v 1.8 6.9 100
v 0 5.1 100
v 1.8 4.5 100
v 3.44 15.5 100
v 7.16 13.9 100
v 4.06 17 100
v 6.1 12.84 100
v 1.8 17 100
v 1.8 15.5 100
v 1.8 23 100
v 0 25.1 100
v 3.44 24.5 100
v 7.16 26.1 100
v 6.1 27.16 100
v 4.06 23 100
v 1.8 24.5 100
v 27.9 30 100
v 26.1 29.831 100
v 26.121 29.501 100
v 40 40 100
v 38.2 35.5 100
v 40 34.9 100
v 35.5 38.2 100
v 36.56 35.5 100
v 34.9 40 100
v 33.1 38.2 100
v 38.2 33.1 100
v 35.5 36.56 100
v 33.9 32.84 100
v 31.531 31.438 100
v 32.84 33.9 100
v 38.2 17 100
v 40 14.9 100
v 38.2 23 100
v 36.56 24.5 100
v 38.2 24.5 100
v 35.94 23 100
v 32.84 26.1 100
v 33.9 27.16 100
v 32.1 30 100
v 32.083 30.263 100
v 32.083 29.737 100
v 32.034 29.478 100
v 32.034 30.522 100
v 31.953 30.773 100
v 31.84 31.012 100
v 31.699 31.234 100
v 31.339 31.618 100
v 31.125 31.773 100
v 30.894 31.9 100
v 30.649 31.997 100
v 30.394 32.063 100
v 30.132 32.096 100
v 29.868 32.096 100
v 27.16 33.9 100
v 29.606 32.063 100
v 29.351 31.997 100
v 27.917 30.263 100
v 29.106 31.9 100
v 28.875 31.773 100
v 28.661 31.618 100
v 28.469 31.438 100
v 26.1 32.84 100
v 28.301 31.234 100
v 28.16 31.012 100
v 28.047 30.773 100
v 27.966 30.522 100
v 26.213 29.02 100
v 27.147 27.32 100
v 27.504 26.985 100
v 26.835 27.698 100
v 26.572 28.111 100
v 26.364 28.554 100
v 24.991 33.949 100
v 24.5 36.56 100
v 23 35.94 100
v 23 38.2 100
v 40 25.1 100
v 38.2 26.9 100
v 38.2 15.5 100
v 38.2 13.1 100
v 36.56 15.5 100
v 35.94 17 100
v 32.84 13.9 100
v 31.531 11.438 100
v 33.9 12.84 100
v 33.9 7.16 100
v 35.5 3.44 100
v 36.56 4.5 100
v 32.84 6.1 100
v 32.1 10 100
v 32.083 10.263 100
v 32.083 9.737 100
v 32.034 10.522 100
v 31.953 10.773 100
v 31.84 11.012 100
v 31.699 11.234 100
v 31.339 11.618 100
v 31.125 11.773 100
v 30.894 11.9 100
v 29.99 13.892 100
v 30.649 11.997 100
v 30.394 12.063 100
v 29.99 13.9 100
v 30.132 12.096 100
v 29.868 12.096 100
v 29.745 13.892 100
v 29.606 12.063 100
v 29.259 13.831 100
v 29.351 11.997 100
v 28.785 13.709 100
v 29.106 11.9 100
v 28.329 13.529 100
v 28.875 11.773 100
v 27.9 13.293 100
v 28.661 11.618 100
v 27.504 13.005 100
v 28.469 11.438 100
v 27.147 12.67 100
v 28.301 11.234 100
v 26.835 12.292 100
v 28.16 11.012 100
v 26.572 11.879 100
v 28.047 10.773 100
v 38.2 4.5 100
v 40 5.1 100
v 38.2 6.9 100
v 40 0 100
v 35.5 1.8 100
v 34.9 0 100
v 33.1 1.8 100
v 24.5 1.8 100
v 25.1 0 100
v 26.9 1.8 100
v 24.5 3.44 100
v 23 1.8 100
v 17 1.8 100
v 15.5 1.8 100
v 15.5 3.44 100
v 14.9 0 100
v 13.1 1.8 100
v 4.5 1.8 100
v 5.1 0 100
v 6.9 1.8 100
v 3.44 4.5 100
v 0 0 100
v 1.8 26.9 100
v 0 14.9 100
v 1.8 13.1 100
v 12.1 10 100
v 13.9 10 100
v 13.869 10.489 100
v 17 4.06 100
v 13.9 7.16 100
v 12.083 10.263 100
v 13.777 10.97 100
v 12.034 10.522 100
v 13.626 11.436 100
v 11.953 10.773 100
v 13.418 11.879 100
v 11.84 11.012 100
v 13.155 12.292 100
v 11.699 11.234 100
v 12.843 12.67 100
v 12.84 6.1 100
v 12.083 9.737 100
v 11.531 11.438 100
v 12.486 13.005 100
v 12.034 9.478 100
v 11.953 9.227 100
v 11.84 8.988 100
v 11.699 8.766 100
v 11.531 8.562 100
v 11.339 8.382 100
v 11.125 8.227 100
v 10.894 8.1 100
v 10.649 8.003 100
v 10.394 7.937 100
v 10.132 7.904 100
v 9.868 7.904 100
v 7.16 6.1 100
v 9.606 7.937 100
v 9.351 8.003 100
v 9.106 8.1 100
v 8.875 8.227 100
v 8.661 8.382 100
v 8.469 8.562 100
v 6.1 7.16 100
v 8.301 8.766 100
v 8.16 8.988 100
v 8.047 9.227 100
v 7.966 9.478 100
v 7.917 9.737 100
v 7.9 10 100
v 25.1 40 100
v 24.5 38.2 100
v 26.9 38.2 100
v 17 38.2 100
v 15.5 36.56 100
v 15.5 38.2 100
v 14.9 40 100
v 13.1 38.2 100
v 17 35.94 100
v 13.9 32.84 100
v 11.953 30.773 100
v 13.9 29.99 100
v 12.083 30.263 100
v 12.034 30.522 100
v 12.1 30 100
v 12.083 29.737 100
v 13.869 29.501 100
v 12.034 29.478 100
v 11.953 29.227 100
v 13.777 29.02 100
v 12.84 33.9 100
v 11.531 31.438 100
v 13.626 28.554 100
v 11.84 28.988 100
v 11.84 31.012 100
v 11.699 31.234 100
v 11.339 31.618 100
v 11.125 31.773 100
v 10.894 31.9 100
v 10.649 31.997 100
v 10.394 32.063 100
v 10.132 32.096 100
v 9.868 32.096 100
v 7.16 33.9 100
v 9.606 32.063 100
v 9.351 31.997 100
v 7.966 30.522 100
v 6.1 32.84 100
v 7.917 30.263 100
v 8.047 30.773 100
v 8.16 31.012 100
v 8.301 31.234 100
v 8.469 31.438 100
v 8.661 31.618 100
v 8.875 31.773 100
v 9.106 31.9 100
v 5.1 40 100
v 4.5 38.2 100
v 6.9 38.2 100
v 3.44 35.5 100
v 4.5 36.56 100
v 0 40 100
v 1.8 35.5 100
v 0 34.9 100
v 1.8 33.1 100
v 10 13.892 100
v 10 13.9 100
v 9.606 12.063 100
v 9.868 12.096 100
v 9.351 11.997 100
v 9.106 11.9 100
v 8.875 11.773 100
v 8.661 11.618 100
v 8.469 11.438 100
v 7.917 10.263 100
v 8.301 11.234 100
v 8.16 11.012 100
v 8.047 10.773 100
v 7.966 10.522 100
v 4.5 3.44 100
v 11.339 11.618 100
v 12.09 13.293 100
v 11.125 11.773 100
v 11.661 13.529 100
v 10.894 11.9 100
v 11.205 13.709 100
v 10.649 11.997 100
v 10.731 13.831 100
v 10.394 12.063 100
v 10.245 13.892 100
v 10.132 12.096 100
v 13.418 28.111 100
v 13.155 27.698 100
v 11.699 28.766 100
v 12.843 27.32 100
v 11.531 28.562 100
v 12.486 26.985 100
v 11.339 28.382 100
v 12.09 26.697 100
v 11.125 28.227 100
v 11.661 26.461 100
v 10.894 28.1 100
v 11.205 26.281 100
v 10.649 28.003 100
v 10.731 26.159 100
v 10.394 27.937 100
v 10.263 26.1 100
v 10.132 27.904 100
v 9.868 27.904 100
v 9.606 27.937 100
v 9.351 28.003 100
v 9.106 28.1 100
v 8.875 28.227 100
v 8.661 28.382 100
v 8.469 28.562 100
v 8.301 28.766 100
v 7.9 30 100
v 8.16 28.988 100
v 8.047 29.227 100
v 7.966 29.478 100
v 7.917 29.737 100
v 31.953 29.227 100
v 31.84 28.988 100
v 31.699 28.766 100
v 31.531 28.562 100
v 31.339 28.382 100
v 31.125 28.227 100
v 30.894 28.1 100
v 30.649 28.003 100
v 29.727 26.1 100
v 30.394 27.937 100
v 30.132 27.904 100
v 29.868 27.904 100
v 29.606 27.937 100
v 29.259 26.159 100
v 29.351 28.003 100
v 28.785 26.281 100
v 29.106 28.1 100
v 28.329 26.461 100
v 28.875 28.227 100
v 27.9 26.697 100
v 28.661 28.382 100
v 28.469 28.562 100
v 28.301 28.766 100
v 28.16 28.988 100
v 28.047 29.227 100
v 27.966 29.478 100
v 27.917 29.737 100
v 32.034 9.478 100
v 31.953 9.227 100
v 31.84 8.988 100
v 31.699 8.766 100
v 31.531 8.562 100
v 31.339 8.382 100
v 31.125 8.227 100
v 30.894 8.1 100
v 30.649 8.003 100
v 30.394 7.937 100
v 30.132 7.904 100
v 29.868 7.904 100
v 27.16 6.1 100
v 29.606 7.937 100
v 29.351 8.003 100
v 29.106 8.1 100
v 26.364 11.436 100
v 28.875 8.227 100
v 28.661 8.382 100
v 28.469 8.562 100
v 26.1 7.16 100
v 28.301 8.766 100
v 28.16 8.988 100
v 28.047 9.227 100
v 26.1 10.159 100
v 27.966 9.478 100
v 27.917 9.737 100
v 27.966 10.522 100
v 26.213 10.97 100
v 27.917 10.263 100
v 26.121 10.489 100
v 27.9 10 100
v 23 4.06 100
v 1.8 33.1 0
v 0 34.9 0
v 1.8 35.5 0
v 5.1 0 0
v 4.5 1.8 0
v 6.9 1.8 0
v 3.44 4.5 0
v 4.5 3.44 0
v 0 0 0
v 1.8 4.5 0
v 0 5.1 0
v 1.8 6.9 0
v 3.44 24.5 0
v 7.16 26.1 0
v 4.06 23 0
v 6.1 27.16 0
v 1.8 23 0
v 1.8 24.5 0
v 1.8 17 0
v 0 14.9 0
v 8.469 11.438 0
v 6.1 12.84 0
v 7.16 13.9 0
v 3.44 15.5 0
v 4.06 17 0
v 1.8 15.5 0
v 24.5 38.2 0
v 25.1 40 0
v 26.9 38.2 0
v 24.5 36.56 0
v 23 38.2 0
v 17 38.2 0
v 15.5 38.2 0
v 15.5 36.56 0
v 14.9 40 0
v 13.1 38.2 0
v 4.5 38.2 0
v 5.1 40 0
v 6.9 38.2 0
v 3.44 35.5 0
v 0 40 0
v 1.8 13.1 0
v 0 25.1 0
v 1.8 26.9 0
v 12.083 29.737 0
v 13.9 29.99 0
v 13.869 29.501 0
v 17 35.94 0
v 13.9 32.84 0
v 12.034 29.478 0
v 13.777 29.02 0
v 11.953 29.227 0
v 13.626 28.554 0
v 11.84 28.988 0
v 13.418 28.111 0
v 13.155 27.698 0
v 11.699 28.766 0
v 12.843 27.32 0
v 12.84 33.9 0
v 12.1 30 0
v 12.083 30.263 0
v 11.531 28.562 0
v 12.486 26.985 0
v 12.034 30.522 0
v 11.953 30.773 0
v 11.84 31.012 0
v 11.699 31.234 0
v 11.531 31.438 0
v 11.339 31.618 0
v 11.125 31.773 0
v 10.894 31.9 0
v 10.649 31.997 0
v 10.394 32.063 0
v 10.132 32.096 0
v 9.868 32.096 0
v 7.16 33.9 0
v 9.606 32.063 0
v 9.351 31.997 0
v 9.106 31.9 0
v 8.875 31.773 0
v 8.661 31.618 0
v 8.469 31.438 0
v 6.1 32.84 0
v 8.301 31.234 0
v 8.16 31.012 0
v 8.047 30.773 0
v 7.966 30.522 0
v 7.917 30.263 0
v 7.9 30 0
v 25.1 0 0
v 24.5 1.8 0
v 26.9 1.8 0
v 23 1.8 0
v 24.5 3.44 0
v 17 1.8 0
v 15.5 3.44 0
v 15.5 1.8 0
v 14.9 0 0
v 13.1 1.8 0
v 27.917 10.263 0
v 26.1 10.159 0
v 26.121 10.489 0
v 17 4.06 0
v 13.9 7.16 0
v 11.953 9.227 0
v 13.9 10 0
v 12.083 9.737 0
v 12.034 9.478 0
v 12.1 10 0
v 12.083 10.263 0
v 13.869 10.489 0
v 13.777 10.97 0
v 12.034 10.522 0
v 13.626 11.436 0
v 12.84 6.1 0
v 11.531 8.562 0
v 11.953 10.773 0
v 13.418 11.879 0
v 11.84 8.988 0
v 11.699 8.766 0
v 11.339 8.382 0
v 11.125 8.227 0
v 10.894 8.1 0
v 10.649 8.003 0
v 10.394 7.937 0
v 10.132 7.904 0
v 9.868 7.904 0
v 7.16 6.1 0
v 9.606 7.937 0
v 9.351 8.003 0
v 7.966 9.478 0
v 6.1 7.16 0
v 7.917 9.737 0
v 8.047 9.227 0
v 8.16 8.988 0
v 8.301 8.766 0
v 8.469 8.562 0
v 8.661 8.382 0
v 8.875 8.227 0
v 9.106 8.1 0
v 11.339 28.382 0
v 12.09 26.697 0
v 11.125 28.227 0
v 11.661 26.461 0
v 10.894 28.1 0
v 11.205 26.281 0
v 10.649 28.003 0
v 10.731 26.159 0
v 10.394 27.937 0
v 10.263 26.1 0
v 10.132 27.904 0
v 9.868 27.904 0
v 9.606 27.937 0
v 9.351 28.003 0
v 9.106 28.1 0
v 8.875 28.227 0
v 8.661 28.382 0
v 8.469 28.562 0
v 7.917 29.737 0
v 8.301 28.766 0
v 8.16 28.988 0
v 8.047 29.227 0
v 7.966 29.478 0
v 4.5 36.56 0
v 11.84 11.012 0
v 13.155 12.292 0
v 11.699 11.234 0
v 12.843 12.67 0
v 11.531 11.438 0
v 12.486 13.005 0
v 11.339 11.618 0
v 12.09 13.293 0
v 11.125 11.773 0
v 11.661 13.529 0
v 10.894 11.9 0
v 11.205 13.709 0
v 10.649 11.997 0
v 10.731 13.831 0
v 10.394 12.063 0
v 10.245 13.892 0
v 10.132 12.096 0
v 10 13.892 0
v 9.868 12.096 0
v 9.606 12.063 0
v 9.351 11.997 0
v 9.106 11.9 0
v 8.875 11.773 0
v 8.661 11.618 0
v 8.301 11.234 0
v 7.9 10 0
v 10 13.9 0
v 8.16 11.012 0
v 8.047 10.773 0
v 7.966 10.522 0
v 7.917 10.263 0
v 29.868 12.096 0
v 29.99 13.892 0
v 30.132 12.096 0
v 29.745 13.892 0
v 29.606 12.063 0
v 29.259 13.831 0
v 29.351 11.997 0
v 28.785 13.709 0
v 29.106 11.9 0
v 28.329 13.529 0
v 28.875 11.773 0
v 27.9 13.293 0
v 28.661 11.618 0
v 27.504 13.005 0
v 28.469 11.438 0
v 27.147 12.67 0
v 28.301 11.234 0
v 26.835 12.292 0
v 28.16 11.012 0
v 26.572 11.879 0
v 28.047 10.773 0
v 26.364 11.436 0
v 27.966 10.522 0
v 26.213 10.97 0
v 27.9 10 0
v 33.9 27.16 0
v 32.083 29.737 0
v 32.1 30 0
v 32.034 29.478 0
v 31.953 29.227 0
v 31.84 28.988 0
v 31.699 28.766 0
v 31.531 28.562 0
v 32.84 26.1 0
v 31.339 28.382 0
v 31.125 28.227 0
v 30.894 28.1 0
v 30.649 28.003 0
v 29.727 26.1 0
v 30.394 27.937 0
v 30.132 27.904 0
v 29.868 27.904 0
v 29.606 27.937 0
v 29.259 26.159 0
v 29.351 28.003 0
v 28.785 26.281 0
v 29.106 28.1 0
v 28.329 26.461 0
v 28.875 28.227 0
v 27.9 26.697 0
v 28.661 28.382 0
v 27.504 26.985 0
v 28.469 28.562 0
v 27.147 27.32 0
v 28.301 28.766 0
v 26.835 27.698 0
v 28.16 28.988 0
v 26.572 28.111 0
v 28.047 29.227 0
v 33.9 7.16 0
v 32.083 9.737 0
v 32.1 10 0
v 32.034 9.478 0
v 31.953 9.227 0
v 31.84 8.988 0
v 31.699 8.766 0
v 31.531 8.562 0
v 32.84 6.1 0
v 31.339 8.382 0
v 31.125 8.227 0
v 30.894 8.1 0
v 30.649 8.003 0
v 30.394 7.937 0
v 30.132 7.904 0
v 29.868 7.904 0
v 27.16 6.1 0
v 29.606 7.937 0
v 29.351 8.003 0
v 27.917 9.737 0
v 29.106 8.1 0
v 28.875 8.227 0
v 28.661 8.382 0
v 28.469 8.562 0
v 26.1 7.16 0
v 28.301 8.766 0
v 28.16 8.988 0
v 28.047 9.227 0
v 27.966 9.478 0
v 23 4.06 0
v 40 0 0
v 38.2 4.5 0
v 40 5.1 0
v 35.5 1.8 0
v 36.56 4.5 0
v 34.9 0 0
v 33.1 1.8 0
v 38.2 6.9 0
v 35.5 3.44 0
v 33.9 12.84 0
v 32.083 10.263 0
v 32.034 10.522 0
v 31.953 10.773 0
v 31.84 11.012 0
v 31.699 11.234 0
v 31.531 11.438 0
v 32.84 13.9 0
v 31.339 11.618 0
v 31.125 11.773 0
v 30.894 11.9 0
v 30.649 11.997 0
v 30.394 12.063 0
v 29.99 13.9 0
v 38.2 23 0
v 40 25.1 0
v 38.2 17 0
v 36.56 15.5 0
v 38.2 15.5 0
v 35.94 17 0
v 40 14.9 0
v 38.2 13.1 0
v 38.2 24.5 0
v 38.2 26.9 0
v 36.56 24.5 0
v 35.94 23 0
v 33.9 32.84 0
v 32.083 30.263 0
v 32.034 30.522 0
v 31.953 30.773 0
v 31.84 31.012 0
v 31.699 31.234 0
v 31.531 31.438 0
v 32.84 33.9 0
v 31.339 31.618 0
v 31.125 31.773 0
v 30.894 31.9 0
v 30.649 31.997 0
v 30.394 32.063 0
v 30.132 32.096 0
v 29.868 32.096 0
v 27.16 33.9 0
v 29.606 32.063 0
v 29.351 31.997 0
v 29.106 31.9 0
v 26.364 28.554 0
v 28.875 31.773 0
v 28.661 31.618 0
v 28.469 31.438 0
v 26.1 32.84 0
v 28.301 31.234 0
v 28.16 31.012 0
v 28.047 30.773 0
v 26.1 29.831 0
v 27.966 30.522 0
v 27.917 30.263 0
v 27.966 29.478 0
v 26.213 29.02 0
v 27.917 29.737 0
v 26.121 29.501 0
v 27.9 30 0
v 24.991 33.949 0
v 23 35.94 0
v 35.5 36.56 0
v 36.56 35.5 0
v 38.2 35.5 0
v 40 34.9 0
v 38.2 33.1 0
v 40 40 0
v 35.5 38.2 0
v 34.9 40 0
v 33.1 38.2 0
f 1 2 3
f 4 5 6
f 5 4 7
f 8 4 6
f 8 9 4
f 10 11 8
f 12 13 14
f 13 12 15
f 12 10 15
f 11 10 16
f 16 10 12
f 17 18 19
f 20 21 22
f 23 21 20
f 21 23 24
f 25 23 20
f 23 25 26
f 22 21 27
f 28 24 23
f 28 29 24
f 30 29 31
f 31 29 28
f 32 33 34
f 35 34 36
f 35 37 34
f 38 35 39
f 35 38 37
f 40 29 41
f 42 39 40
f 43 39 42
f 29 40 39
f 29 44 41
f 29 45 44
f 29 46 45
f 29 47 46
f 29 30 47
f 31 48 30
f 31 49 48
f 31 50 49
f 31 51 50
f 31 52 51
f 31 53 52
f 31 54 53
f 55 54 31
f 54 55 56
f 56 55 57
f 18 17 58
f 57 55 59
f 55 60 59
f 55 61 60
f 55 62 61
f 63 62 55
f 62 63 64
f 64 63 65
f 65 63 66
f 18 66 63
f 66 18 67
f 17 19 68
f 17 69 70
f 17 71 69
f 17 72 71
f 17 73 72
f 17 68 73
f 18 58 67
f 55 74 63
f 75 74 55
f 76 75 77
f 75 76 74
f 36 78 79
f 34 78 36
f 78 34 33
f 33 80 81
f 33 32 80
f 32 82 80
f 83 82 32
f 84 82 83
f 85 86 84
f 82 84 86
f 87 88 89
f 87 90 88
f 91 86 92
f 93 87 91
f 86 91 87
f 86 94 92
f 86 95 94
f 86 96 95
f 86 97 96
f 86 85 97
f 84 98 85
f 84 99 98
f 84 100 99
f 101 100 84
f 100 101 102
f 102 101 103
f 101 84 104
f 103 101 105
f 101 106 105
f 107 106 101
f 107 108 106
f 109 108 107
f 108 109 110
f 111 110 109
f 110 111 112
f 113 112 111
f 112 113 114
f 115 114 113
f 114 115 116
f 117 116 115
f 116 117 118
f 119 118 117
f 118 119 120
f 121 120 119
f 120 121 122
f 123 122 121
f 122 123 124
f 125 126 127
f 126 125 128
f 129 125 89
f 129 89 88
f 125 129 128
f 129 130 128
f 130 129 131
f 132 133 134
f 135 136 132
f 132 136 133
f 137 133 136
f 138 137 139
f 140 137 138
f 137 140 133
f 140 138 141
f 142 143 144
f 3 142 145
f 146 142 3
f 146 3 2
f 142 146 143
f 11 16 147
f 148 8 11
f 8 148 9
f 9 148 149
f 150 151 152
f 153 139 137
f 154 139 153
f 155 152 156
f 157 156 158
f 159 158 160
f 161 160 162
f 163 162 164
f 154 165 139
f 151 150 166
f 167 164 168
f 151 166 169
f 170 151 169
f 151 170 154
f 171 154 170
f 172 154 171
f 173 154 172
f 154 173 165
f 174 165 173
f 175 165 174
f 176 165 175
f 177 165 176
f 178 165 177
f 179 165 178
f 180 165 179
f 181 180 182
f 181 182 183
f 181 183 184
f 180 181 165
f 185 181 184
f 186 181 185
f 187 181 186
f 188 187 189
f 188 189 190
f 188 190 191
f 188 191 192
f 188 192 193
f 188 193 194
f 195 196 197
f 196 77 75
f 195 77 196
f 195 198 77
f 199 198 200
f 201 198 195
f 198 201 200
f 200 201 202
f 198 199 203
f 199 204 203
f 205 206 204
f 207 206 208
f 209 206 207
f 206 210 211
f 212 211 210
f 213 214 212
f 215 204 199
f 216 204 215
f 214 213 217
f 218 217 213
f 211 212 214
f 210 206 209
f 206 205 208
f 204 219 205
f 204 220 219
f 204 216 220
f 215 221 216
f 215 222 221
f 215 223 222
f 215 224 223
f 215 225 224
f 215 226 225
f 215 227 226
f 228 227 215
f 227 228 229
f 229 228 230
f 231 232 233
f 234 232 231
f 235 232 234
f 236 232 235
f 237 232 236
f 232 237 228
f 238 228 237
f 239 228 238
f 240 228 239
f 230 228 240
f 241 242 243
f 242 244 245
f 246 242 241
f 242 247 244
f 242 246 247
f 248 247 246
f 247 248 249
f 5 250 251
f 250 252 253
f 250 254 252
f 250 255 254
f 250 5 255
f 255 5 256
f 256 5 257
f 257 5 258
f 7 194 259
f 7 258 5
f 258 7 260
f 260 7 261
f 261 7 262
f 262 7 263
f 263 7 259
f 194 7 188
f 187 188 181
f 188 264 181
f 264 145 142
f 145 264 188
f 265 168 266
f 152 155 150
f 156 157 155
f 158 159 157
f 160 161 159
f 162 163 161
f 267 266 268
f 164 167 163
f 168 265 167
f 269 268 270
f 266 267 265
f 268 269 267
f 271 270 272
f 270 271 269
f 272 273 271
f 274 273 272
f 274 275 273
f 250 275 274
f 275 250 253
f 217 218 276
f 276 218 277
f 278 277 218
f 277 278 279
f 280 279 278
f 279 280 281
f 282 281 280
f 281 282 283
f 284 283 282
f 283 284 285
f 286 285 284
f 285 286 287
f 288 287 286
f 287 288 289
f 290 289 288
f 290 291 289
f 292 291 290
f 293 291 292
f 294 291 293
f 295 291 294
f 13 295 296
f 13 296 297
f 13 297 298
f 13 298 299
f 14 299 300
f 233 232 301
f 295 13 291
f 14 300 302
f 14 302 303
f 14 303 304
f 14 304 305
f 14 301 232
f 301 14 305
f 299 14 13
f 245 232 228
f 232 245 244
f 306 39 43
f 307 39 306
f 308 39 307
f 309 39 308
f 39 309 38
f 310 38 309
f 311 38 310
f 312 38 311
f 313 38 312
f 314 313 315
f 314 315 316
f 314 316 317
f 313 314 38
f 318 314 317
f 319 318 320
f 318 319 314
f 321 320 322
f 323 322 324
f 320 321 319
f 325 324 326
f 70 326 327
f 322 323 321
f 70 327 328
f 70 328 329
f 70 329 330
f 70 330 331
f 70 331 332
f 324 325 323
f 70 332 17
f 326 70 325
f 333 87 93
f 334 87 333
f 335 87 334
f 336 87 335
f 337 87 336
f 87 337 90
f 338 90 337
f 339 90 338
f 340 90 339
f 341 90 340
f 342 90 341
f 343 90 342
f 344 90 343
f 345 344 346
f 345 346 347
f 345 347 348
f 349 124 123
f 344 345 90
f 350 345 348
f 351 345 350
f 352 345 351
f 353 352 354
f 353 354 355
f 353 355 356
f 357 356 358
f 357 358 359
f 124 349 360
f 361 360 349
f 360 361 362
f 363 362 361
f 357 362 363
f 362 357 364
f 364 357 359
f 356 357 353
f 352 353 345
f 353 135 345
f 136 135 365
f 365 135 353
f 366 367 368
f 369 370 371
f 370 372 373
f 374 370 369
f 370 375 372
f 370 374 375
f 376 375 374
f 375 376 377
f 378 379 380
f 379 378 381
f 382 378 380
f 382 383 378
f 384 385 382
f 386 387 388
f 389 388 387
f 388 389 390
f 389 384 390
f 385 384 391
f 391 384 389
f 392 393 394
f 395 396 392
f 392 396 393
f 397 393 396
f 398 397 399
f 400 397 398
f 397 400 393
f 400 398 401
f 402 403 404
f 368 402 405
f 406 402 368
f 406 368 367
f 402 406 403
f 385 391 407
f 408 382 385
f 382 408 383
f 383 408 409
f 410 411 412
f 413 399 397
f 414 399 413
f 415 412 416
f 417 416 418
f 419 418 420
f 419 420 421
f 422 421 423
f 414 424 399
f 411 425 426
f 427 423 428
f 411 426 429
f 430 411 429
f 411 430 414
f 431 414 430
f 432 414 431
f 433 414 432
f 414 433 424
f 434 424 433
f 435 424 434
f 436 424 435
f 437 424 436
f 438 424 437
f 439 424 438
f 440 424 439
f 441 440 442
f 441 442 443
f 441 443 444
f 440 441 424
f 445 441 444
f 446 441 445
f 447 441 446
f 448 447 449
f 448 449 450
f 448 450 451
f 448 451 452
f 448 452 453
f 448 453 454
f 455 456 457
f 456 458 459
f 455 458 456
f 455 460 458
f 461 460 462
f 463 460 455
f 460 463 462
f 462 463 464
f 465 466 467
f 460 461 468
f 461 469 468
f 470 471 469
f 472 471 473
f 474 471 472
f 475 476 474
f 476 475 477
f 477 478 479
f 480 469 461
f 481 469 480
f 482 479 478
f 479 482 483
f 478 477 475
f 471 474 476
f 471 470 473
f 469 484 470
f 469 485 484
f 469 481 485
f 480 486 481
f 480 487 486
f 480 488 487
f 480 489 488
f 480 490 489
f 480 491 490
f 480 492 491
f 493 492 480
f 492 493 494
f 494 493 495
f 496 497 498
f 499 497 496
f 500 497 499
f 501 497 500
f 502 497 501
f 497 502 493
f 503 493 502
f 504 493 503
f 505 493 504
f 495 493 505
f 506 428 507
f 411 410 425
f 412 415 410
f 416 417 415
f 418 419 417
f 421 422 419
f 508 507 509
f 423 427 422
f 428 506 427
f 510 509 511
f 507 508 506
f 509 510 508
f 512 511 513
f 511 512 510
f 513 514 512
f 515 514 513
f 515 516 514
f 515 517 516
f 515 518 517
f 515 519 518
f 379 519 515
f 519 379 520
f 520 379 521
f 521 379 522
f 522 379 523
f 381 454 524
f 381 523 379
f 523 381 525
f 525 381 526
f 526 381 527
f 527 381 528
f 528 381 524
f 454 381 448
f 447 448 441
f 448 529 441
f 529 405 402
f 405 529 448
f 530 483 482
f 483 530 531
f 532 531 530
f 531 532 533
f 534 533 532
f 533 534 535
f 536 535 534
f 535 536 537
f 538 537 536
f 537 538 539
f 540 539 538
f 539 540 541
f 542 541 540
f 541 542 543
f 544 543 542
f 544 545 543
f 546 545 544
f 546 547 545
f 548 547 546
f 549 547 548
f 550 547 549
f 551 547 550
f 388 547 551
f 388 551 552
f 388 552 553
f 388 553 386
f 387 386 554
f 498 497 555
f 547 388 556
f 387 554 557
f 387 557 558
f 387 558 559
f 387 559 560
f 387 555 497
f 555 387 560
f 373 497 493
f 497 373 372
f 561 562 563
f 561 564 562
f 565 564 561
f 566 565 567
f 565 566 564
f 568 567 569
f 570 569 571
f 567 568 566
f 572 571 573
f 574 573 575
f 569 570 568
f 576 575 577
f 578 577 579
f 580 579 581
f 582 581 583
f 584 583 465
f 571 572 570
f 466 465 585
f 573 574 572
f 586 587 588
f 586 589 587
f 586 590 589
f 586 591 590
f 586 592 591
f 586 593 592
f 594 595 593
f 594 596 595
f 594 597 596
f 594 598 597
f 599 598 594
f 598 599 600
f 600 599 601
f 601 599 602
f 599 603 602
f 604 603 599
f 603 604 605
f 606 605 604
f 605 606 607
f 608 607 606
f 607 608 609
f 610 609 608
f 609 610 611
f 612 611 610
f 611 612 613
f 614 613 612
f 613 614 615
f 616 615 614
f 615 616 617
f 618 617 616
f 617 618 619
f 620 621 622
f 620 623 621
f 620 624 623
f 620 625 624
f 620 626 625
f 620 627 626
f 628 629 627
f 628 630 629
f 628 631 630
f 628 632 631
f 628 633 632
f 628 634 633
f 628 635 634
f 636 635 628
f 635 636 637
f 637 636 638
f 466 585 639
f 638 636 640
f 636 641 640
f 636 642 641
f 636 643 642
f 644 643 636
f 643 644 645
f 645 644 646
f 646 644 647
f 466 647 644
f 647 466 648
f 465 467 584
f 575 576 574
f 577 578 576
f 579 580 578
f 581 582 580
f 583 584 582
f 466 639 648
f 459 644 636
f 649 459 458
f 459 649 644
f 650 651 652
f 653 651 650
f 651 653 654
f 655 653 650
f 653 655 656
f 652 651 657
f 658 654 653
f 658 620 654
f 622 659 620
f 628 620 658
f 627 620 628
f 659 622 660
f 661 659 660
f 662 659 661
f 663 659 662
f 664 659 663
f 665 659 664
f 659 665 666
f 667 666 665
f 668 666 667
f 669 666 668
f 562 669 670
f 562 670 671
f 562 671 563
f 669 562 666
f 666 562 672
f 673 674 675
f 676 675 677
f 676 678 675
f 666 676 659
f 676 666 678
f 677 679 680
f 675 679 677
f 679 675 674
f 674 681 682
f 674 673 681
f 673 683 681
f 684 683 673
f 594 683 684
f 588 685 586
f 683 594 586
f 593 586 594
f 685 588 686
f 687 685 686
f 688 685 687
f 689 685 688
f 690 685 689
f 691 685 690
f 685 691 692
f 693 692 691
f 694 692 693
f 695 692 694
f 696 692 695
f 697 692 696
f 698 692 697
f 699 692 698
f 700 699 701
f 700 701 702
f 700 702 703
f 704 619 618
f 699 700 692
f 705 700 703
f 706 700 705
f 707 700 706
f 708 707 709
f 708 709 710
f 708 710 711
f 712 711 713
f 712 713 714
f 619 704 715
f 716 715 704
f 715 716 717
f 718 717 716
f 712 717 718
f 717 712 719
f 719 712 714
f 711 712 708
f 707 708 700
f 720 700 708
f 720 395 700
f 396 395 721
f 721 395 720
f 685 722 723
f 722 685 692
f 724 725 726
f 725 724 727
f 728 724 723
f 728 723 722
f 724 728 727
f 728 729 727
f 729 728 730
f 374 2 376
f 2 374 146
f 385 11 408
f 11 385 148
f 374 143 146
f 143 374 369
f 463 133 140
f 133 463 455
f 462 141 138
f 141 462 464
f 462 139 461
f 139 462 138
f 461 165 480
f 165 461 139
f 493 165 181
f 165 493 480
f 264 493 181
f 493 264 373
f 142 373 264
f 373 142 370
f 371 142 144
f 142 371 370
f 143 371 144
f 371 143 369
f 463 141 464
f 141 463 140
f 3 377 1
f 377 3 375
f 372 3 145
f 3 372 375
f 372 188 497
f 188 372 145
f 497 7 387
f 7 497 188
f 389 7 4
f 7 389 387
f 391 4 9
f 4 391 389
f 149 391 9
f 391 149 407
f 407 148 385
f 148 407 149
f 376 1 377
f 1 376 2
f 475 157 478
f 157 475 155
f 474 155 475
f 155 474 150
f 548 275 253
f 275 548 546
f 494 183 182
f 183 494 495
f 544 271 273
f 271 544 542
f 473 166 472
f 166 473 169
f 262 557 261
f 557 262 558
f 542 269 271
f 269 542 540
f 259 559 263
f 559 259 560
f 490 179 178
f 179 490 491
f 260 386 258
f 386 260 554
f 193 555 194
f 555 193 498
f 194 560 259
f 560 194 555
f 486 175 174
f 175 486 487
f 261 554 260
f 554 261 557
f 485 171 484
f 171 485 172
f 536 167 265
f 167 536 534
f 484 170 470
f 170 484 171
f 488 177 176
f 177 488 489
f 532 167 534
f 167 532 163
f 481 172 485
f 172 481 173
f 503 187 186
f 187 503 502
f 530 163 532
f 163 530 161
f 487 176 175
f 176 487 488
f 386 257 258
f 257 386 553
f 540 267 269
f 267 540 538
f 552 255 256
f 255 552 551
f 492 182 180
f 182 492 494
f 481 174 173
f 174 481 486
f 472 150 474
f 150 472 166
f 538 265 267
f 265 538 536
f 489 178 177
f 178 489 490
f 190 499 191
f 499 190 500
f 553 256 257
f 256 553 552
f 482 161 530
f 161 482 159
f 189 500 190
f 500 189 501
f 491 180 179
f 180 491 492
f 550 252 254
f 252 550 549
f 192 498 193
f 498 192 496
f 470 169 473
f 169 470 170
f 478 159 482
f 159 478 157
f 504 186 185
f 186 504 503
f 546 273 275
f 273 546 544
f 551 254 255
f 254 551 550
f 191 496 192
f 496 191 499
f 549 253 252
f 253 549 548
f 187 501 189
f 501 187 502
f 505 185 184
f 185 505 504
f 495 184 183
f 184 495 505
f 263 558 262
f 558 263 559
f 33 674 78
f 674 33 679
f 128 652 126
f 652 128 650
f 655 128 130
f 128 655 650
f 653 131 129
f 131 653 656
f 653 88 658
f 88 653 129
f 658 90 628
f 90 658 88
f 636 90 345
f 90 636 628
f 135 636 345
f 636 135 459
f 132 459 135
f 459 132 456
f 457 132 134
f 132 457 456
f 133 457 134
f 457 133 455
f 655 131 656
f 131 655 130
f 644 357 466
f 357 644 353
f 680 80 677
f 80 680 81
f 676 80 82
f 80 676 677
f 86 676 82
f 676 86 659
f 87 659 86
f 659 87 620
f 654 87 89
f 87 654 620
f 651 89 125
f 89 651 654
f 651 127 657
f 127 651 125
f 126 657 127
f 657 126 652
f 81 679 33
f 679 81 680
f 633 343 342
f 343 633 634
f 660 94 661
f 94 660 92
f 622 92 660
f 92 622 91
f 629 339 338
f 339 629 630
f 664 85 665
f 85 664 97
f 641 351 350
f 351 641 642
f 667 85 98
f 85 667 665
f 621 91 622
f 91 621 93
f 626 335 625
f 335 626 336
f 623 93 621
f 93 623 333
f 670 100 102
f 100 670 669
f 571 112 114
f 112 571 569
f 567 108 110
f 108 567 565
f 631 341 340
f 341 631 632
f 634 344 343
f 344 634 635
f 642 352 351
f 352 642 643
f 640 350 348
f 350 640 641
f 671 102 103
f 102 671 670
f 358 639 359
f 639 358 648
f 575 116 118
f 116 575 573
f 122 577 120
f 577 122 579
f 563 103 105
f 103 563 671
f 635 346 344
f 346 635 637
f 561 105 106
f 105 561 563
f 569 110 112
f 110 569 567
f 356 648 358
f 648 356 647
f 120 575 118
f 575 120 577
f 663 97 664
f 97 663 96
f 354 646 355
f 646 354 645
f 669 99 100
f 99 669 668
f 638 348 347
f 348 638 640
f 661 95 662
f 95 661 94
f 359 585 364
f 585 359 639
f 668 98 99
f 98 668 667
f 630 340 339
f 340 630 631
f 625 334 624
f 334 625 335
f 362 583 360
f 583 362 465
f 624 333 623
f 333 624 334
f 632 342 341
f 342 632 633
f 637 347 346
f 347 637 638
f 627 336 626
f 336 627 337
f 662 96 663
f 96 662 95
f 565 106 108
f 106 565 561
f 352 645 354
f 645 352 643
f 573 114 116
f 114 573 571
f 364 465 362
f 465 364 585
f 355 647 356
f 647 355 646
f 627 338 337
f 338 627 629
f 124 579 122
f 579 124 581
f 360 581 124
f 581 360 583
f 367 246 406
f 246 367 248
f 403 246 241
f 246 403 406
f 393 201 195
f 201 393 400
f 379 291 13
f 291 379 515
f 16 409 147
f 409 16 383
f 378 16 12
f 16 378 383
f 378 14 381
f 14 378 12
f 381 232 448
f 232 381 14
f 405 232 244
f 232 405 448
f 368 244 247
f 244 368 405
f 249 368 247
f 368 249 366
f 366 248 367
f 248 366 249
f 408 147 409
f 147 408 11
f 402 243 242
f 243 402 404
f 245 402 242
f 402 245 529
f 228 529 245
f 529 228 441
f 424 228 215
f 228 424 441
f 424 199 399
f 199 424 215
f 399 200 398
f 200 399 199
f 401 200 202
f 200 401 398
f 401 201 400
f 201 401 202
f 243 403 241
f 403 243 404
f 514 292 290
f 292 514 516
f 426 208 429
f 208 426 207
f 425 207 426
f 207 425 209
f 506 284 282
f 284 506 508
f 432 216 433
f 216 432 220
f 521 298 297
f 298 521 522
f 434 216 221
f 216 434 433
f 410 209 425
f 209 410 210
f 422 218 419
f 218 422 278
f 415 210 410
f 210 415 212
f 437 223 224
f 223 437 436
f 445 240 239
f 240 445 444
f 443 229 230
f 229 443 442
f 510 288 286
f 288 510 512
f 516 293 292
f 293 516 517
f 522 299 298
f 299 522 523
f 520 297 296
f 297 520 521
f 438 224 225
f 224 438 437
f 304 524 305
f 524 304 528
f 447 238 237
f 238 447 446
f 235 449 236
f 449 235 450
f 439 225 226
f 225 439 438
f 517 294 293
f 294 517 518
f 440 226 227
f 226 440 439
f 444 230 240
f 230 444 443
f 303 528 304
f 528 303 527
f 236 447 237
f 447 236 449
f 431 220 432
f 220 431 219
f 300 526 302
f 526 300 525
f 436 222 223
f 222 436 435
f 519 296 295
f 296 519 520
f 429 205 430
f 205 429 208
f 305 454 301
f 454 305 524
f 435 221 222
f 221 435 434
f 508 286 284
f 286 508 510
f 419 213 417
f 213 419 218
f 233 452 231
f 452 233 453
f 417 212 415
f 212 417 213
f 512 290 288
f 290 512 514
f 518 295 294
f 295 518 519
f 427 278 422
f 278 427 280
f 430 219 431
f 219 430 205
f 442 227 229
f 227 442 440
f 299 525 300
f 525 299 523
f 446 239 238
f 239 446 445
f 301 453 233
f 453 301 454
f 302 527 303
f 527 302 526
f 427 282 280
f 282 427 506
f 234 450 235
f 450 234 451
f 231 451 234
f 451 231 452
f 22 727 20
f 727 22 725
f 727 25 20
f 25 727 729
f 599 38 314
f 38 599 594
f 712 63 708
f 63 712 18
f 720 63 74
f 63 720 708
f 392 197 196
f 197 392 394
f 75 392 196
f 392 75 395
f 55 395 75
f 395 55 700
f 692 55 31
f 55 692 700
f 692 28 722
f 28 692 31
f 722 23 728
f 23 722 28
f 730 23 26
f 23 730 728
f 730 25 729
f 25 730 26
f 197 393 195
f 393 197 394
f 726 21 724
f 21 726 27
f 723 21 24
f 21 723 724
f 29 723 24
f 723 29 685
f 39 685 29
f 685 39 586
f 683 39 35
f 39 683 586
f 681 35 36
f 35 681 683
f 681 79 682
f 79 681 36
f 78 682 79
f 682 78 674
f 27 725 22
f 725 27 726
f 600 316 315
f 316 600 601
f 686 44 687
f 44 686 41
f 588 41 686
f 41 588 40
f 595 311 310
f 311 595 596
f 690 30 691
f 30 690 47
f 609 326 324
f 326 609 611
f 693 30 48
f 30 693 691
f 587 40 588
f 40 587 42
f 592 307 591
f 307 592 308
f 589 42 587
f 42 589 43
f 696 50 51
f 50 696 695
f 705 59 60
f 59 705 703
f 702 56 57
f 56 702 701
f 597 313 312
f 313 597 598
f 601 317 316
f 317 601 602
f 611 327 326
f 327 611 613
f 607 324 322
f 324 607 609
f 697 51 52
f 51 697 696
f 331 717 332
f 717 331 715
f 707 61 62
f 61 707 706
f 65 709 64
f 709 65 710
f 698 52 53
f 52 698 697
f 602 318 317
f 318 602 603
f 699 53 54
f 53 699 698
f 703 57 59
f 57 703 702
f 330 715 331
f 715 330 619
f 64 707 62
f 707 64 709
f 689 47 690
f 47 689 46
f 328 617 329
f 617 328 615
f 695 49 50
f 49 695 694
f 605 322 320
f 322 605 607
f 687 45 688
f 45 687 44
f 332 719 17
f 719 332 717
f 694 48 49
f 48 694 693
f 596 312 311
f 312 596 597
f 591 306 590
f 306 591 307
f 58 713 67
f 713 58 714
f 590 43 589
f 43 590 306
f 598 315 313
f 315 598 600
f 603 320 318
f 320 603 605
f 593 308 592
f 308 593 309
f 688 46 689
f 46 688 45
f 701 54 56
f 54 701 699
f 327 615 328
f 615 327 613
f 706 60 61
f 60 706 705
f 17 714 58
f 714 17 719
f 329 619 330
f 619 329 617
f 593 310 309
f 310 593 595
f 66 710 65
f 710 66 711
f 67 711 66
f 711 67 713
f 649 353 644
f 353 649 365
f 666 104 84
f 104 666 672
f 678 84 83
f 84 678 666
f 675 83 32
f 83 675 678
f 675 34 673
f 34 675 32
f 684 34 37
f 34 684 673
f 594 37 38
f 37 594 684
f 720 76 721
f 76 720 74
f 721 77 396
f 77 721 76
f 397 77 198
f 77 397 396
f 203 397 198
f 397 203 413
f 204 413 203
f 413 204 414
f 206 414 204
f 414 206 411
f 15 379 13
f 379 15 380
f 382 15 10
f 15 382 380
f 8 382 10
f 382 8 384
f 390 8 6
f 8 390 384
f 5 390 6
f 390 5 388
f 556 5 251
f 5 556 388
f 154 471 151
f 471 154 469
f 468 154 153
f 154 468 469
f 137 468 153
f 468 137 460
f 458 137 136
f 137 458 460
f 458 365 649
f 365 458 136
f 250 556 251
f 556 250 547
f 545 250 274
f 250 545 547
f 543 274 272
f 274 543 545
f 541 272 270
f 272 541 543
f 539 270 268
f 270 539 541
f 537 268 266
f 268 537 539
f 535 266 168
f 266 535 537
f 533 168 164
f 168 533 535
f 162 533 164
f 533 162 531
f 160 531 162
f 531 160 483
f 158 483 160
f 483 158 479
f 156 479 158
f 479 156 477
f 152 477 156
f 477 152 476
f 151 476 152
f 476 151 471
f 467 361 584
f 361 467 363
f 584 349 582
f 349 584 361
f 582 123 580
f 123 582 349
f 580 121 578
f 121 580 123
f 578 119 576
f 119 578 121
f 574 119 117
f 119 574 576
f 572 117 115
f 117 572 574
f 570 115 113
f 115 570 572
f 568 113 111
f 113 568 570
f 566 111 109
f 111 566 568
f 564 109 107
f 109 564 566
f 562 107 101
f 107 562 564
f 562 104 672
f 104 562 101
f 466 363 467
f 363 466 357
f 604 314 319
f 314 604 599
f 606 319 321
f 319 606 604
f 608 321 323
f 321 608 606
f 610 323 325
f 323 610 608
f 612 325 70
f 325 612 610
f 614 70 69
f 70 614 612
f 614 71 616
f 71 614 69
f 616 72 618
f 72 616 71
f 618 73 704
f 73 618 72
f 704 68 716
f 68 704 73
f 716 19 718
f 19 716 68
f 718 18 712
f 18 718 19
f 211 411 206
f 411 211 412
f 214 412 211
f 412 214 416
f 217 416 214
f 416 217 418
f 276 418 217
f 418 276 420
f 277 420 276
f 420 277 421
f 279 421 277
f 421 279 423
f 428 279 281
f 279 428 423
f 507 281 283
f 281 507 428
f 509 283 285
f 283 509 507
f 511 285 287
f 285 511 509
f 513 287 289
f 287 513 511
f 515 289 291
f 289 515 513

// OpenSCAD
// Generated by SolidPython 1.1.3 on 2022-04-28 23:56:22


difference() {
	union() {
		difference() {
			cube(size = [20.0000000000, 20.0000000000, 100]);
			translate(v = [5.1000000000, 0, 0]) {
				linear_extrude(center = false, convexity = 10, height = 100, twist = 0) {
					polygon(points = [[0.0000000000, 0.0000000000], [1.8000000000, 1.8000000000], [-0.6000000000, 1.8000000000], [-0.6000000000, 3.4400000000], [2.0600000000, 6.1000000000], [7.7400000000, 6.1000000000], [10.4000000000, 3.4400000000], [10.4000000000, 1.8000000000], [8, 1.8000000000], [9.8000000000, 0.0000000000], [0.0000000000, 0.0000000000]]);
				}
			}
			translate(v = [0, 14.9000000000, 0]) {
				rotate(a = [0, 0, 270]) {
					linear_extrude(center = false, convexity = 10, height = 100, twist = 0) {
						polygon(points = [[0.0000000000, 0.0000000000], [1.8000000000, 1.8000000000], [-0.6000000000, 1.8000000000], [-0.6000000000, 3.4400000000], [2.0600000000, 6.1000000000], [7.7400000000, 6.1000000000], [10.4000000000, 3.4400000000], [10.4000000000, 1.8000000000], [8, 1.8000000000], [9.8000000000, 0.0000000000], [0.0000000000, 0.0000000000]]);
					}
				}
			}
			translate(v = [14.9000000000, 0, 0]) {
				translate(v = [0, 20.0000000000, 0]) {
					rotate(a = [0, 0, 180]) {
						linear_extrude(center = false, convexity = 10, height = 100, twist = 0) {
							polygon(points = [[0.0000000000, 0.0000000000], [1.8000000000, 1.8000000000], [-0.6000000000, 1.8000000000], [-0.6000000000, 3.4400000000], [2.0600000000, 6.1000000000], [7.7400000000, 6.1000000000], [10.4000000000, 3.4400000000], [10.4000000000, 1.8000000000], [8, 1.8000000000], [9.8000000000, 0.0000000000], [0.0000000000, 0.0000000000]]);
						}
					}
				}
			}
			translate(v = [20.0000000000, 0, 0]) {
				translate(v = [0, 5.1000000000, 0]) {
					rotate(a = [0, 0, 90]) {
						linear_extrude(center = false, convexity = 10, height = 100, twist = 0) {
							polygon(points = [[0.0000000000, 0.0000000000], [1.8000000000, 1.8000000000], [-0.6000000000, 1.8000000000], [-0.6000000000, 3.4400000000], [2.0600000000, 6.1000000000], [7.7400000000, 6.1000000000], [10.4000000000, 3.4400000000], [10.4000000000, 1.8000000000], [8, 1.8000000000], [9.8000000000, 0.0000000000], [0.0000000000, 0.0000000000]]);
						}
					}
				}
			}
			translate(v = [0, 10.0000000000, 0]) {
				translate(v = [10.0000000000, 0, 0]) {
					cylinder($fn = 50, h = 100, r = 2.1000000000);
				}
			}
		}
		translate(v = [20, 0, 0]) {
			difference() {
				cube(size = [20.0000000000, 20.0000000000, 100]);
				translate(v = [5.1000000000, 0, 0]) {
					linear_extrude(center = false, convexity = 10, height = 100, twist = 0) {
						polygon(points = [[0.0000000000, 0.0000000000], [1.8000000000, 1.8000000000], [-0.6000000000, 1.8000000000], [-0.6000000000, 3.4400000000], [2.0600000000, 6.1000000000], [7.7400000000, 6.1000000000], [10.4000000000, 3.4400000000], [10.4000000000, 1.8000000000], [8, 1.8000000000], [9.8000000000, 0.0000000000], [0.0000000000, 0.0000000000]]);
					}
				}
				translate(v = [0, 14.9000000000, 0]) {
					rotate(a = [0, 0, 270]) {
						linear_extrude(center = false, convexity = 10, height = 100, twist = 0) {
							polygon(points = [[0.0000000000, 0.0000000000], [1.8000000000, 1.8000000000], [-0.6000000000, 1.8000000000], [-0.6000000000, 3.4400000000], [2.0600000000, 6.1000000000], [7.7400000000, 6.1000000000], [10.4000000000, 3.4400000000], [10.4000000000, 1.8000000000], [8, 1.8000000000], [9.8000000000, 0.0000000000], [0.0000000000, 0.0000000000]]);
						}
					}
				}
				translate(v = [14.9000000000, 0, 0]) {
					translate(v = [0, 20.0000000000, 0]) {
						rotate(a = [0, 0, 180]) {
							linear_extrude(center = false, convexity = 10, height = 100, twist = 0) {
								polygon(points = [[0.0000000000, 0.0000000000], [1.8000000000, 1.8000000000], [-0.6000000000, 1.8000000000], [-0.6000000000, 3.4400000000], [2.0600000000, 6.1000000000], [7.7400000000, 6.1000000000], [10.4000000000, 3.4400000000], [10.4000000000, 1.8000000000], [8, 1.8000000000], [9.8000000000, 0.0000000000], [0.0000000000, 0.0000000000]]);
							}
						}
					}
				}
				translate(v = [20.0000000000, 0, 0]) {
					translate(v = [0, 5.1000000000, 0]) {
						rotate(a = [0, 0, 90]) {
							linear_extrude(center = false, convexity = 10, height = 100, twist = 0) {
								polygon(points = [[0.0000000000, 0.0000000000], [1.8000000000, 1.8000000000], [-0.6000000000, 1.8000000000], [-0.6000000000, 3.4400000000], [2.0600000000, 6.1000000000], [7.7400000000, 6.1000000000], [10.4000000000, 3.4400000000], [10.4000000000, 1.8000000000], [8, 1.8000000000], [9.8000000000, 0.0000000000], [0.0000000000, 0.0000000000]]);
							}
						}
					}
				}
				translate(v = [0, 10.0000000000, 0]) {
					translate(v = [10.0000000000, 0, 0]) {
						cylinder($fn = 50, h = 100, r = 2.1000000000);
					}
				}
			}
		}
		translate(v = [0, 20, 0]) {
			difference() {
				cube(size = [20.0000000000, 20.0000000000, 100]);
				translate(v = [5.1000000000, 0, 0]) {
					linear_extrude(center = false, convexity = 10, height = 100, twist = 0) {
						polygon(points = [[0.0000000000, 0.0000000000], [1.8000000000, 1.8000000000], [-0.6000000000, 1.8000000000], [-0.6000000000, 3.4400000000], [2.0600000000, 6.1000000000], [7.7400000000, 6.1000000000], [10.4000000000, 3.4400000000], [10.4000000000, 1.8000000000], [8, 1.8000000000], [9.8000000000, 0.0000000000], [0.0000000000, 0.0000000000]]);
					}
				}
				translate(v = [0, 14.9000000000, 0]) {
					rotate(a = [0, 0, 270]) {
						linear_extrude(center = false, convexity = 10, height = 100, twist = 0) {
							polygon(points = [[0.0000000000, 0.0000000000], [1.8000000000, 1.8000000000], [-0.6000000000, 1.8000000000], [-0.6000000000, 3.4400000000], [2.0600000000, 6.1000000000], [7.7400000000, 6.1000000000], [10.4000000000, 3.4400000000], [10.4000000000, 1.8000000000], [8, 1.8000000000], [9.8000000000, 0.0000000000], [0.0000000000, 0.0000000000]]);
						}
					}
				}
				translate(v = [14.9000000000, 0, 0]) {
					translate(v = [0, 20.0000000000, 0]) {
						rotate(a = [0, 0, 180]) {
							linear_extrude(center = false, convexity = 10, height = 100, twist = 0) {
								polygon(points = [[0.0000000000, 0.0000000000], [1.8000000000, 1.8000000000], [-0.6000000000, 1.8000000000], [-0.6000000000, 3.4400000000], [2.0600000000, 6.1000000000], [7.7400000000, 6.1000000000], [10.4000000000, 3.4400000000], [10.4000000000, 1.8000000000], [8, 1.8000000000], [9.8000000000, 0.0000000000], [0.0000000000, 0.0000000000]]);
							}
						}
					}
				}
				translate(v = [20.0000000000, 0, 0]) {
					translate(v = [0, 5.1000000000, 0]) {
						rotate(a = [0, 0, 90]) {
							linear_extrude(center = false, convexity = 10, height = 100, twist = 0) {
								polygon(points = [[0.0000000000, 0.0000000000], [1.8000000000, 1.8000000000], [-0.6000000000, 1.8000000000], [-0.6000000000, 3.4400000000], [2.0600000000, 6.1000000000], [7.7400000000, 6.1000000000], [10.4000000000, 3.4400000000], [10.4000000000, 1.8000000000], [8, 1.8000000000], [9.8000000000, 0.0000000000], [0.0000000000, 0.0000000000]]);
							}
						}
					}
				}
				translate(v = [0, 10.0000000000, 0]) {
					translate(v = [10.0000000000, 0, 0]) {
						cylinder($fn = 50, h = 100, r = 2.1000000000);
					}
				}
			}
		}
		translate(v = [0, 20, 0]) {
			translate(v = [20, 0, 0]) {
				difference() {
					cube(size = [20.0000000000, 20.0000000000, 100]);
					translate(v = [5.1000000000, 0, 0]) {
						linear_extrude(center = false, convexity = 10, height = 100, twist = 0) {
							polygon(points = [[0.0000000000, 0.0000000000], [1.8000000000, 1.8000000000], [-0.6000000000, 1.8000000000], [-0.6000000000, 3.4400000000], [2.0600000000, 6.1000000000], [7.7400000000, 6.1000000000], [10.4000000000, 3.4400000000], [10.4000000000, 1.8000000000], [8, 1.8000000000], [9.8000000000, 0.0000000000], [0.0000000000, 0.0000000000]]);
						}
					}
					translate(v = [0, 14.9000000000, 0]) {
						rotate(a = [0, 0, 270]) {
							linear_extrude(center = false, convexity = 10, height = 100, twist = 0) {
								polygon(points = [[0.0000000000, 0.0000000000], [1.8000000000, 1.8000000000], [-0.6000000000, 1.8000000000], [-0.6000000000, 3.4400000000], [2.0600000000, 6.1000000000], [7.7400000000, 6.1000000000], [10.4000000000, 3.4400000000], [10.4000000000, 1.8000000000], [8, 1.8000000000], [9.8000000000, 0.0000000000], [0.0000000000, 0.0000000000]]);
							}
						}
					}
					translate(v = [14.9000000000, 0, 0]) {
						translate(v = [0, 20.0000000000, 0]) {
							rotate(a = [0, 0, 180]) {
								linear_extrude(center = false, convexity = 10, height = 100, twist = 0) {
									polygon(points = [[0.0000000000, 0.0000000000], [1.8000000000, 1.8000000000], [-0.6000000000, 1.8000000000], [-0.6000000000, 3.4400000000], [2.0600000000, 6.1000000000], [7.7400000000, 6.1000000000], [10.4000000000, 3.4400000000], [10.4000000000, 1.8000000000], [8, 1.8000000000], [9.8000000000, 0.0000000000], [0.0000000000, 0.0000000000]]);
								}
							}
						}
					}
					translate(v = [20.0000000000, 0, 0]) {
						translate(v = [0, 5.1000000000, 0]) {
							rotate(a = [0, 0, 90]) {
								linear_extrude(center = false, convexity = 10, height = 100, twist = 0) {
									polygon(points = [[0.0000000000, 0.0000000000], [1.8000000000, 1.8000000000], [-0.6000000000, 1.8000000000], [-0.6000000000, 3.4400000000], [2.0600000000, 6.1000000000], [7.7400000000, 6.1000000000], [10.4000000000, 3.4400000000], [10.4000000000, 1.8000000000], [8, 1.8000000000], [9.8000000000, 0.0000000000], [0.0000000000, 0.0000000000]]);
								}
							}
						}
					}
					translate(v = [0, 10.0000000000, 0]) {
						translate(v = [10.0000000000, 0, 0]) {
							cylinder($fn = 50, h = 100, r = 2.1000000000);
						}
					}
				}
			}
		}
	}
	translate(v = [0, 1.8000000000, 0]) {
		translate(v = [1.8000000000, 0, 0]) {
			union() {
				linear_extrude(center = false, convexity = 10, height = 100, twist = 0) {
					polygon(points = [[15.2000000000, 0.0000000000], [21.2000000000, 0.0000000000], [21.2000000000, 2.2600000000], [24.3000000000, 5.3600000000], [24.3000000000, 12.1000000000], [31.0400000000, 12.1000000000], [34.1400000000, 15.2000000000], [36.4000000000, 15.2000000000], [36.4000000000, 21.2000000000], [34.1400000000, 21.2000000000], [31.0400000000, 24.3000000000], [24.3000000000, 24.3000000000], [24.3000000000, 31.0400000000], [21.2000000000, 34.1400000000], [21.2000000000, 36.4000000000], [15.2000000000, 36.4000000000], [15.2000000000, 34.1400000000], [12.1000000000, 31.0400000000], [12.1000000000, 24.3000000000], [5.3600000000, 24.3000000000], [2.2600000000, 21.2000000000], [0.0000000000, 21.2000000000], [0.0000000000, 15.2000000000], [2.2600000000, 15.2000000000], [5.3600000000, 12.1000000000], [12.1000000000, 12.1000000000], [12.1000000000, 5.3600000000], [15.2000000000, 2.2600000000], [15.2000000000, 0.0000000000]]);
				}
				translate(v = [8.2000000000, 0, 0]) {
					translate(v = [0, 8.2000000000, 0]) {
						linear_extrude(center = false, convexity = 10, height = 100, twist = 0) {
							difference() {
								intersection() {
									rotate(a = 0) {
										translate(v = [-996.1000000000, 0, 0]) {
											square(center = false, size = [1000, 1000]);
										}
									}
									rotate(a = 90) {
										translate(v = [-996.1000000000, -1000, 0]) {
											square(center = false, size = [1000, 1000]);
										}
									}
								}
								circle($fn = 50, r = 3.9000000000);
							}
						}
					}
				}
				translate(v = [28.1900000000, 0, 0]) {
					translate(v = [0, 8.2000000000, 0]) {
						linear_extrude(center = false, convexity = 10, height = 100, twist = 0) {
							difference() {
								intersection() {
									rotate(a = 90) {
										translate(v = [-996.1000000000, 0, 0]) {
											square(center = false, size = [1000, 1000]);
										}
									}
									rotate(a = 180) {
										translate(v = [-996.1000000000, -1000, 0]) {
											square(center = false, size = [1000, 1000]);
										}
									}
								}
								circle($fn = 50, r = 3.9000000000);
							}
						}
					}
				}
				translate(v = [28.1900000000, 0, 0]) {
					translate(v = [0, 28.1900000000, 0]) {
						linear_extrude(center = false, convexity = 10, height = 100, twist = 0) {
							difference() {
								intersection() {
									rotate(a = 180) {
										translate(v = [-996.1000000000, 0, 0]) {
											square(center = false, size = [1000, 1000]);
										}
									}
									rotate(a = 270) {
										translate(v = [-996.1000000000, -1000, 0]) {
											square(center = false, size = [1000, 1000]);
										}
									}
								}
								circle($fn = 50, r = 3.9000000000);
							}
						}
					}
				}
				translate(v = [8.2000000000, 0, 0]) {
					translate(v = [0, 28.1900000000, 0]) {
						linear_extrude(center = false, convexity = 10, height = 100, twist = 0) {
							difference() {
								intersection() {
									rotate(a = 270) {
										translate(v = [-996.1000000000, 0, 0]) {
											square(center = false, size = [1000, 1000]);
										}
									}
									rotate(a = 360) {
										translate(v = [-996.1000000000, -1000, 0]) {
											square(center = false, size = [1000, 1000]);
										}
									}
								}
								circle($fn = 50, r = 3.9000000000);
							}
						}
					}
				}
			}
		}
	}
}
/***********************************************
*********      SolidPython code:      **********
************************************************
 
from solid import *
from solid.utils import *  # Not required, but the utils module is useful
from vslot2020 import *

def center_hole_4040(height):
    points = [
        [15.2, 0.0, 0.0],
        [21.2, 0.0, 0.0],
        [21.2, 2.26, 0.0],
        [24.3, 5.36, 0.0],
        [24.3, 12.1, 0.0],
        [31.04, 12.1, 0.0],
        [34.14, 15.2, 0.0],
        [36.4, 15.2, 0.0],
        [36.4, 21.2, 0.0],
        [34.14, 21.2, 0.0],
        [31.04, 24.3, 0.0],
        [24.3, 24.3, 0.0],
        [24.3, 31.04, 0.0],
        [21.2, 34.14, 0.0],
        [21.2, 36.4, 0.0],
        [15.2, 36.4, 0.0],
        [15.2, 34.14, 0.0],
        [12.1, 31.04, 0.0],
        [12.1, 24.3, 0.0],
        [5.36, 24.3, 0.0],
        [2.26, 21.2, 0.0],
        [0.0, 21.2, 0.0],
        [0.0, 15.2, 0.0],
        [2.26, 15.2, 0.0],
        [5.36, 12.1, 0.0],
        [12.1, 12.1, 0.0],
        [12.1, 5.36, 0.0],
        [15.2, 2.26, 0.0],
        [15.2, 0.0, 0.0]
    ];

    solid = linear_extrude(height = height, center = False, convexity = 10, twist = 0)(
        polygon(points)
    );

    solid += right(8.2)(
        forward(8.2)(
            linear_extrude(height=height, center=False, convexity=10, twist=0)(
                arc_inverted(rad=3.9, start_degrees=0, end_degrees=90, segments=50)
            )
        )
    );

    solid += right(28.19)(
        forward(8.2)(
            linear_extrude(height=height, center=False, convexity=10, twist=0)(
                arc_inverted(rad=3.9, start_degrees=90, end_degrees=180, segments=50)
            )
        )
    );

    solid += right(28.19)(
        forward(28.19)(
            linear_extrude(height=height, center=False, convexity=10, twist=0)(
                arc_inverted(rad=3.9, start_degrees=180, end_degrees=270, segments=50)
            )
        )
    );

    solid += right(8.2)(
        forward(28.19)(
            linear_extrude(height=height, center=False, convexity=10, twist=0)(
                arc_inverted(rad=3.9, start_degrees=270, end_degrees=360, segments=50)
            )
        )
    );

    return solid;


def make_4040(height):
    extrusion = make_2020(height);
    extrusion += right(20)(
        make_2020(height)
    );
    extrusion += forward(20)(
        make_2020(height)
    );
    extrusion += forward(20)(
        right(20)(
            make_2020(height)
        )
    );

    extrusion -= forward(1.8)(
        right(1.8)(
            center_hole_4040(height)
        )
    );

    return extrusion;

# Render
scad_render_to_file(make_4040(100), '../../scad/vslot4040_250mm.scad');
scad_render_to_file(make_4040(100), '../../scad/vslot4040_500mm.scad');
scad_render_to_file(make_4040(100), '../../scad/vslot4040_1000mm.scad');
scad_render_to_file(make_4040(100), '../../scad/vslot4040_1500mm.scad');
scad_render_to_file(make_4040(100), '../../scad/vslot4040_2000mm.scad');
scad_render_to_file(center_hole_4040(250), '../../scad/vslot4040hole.scad'); 
 
************************************************/
